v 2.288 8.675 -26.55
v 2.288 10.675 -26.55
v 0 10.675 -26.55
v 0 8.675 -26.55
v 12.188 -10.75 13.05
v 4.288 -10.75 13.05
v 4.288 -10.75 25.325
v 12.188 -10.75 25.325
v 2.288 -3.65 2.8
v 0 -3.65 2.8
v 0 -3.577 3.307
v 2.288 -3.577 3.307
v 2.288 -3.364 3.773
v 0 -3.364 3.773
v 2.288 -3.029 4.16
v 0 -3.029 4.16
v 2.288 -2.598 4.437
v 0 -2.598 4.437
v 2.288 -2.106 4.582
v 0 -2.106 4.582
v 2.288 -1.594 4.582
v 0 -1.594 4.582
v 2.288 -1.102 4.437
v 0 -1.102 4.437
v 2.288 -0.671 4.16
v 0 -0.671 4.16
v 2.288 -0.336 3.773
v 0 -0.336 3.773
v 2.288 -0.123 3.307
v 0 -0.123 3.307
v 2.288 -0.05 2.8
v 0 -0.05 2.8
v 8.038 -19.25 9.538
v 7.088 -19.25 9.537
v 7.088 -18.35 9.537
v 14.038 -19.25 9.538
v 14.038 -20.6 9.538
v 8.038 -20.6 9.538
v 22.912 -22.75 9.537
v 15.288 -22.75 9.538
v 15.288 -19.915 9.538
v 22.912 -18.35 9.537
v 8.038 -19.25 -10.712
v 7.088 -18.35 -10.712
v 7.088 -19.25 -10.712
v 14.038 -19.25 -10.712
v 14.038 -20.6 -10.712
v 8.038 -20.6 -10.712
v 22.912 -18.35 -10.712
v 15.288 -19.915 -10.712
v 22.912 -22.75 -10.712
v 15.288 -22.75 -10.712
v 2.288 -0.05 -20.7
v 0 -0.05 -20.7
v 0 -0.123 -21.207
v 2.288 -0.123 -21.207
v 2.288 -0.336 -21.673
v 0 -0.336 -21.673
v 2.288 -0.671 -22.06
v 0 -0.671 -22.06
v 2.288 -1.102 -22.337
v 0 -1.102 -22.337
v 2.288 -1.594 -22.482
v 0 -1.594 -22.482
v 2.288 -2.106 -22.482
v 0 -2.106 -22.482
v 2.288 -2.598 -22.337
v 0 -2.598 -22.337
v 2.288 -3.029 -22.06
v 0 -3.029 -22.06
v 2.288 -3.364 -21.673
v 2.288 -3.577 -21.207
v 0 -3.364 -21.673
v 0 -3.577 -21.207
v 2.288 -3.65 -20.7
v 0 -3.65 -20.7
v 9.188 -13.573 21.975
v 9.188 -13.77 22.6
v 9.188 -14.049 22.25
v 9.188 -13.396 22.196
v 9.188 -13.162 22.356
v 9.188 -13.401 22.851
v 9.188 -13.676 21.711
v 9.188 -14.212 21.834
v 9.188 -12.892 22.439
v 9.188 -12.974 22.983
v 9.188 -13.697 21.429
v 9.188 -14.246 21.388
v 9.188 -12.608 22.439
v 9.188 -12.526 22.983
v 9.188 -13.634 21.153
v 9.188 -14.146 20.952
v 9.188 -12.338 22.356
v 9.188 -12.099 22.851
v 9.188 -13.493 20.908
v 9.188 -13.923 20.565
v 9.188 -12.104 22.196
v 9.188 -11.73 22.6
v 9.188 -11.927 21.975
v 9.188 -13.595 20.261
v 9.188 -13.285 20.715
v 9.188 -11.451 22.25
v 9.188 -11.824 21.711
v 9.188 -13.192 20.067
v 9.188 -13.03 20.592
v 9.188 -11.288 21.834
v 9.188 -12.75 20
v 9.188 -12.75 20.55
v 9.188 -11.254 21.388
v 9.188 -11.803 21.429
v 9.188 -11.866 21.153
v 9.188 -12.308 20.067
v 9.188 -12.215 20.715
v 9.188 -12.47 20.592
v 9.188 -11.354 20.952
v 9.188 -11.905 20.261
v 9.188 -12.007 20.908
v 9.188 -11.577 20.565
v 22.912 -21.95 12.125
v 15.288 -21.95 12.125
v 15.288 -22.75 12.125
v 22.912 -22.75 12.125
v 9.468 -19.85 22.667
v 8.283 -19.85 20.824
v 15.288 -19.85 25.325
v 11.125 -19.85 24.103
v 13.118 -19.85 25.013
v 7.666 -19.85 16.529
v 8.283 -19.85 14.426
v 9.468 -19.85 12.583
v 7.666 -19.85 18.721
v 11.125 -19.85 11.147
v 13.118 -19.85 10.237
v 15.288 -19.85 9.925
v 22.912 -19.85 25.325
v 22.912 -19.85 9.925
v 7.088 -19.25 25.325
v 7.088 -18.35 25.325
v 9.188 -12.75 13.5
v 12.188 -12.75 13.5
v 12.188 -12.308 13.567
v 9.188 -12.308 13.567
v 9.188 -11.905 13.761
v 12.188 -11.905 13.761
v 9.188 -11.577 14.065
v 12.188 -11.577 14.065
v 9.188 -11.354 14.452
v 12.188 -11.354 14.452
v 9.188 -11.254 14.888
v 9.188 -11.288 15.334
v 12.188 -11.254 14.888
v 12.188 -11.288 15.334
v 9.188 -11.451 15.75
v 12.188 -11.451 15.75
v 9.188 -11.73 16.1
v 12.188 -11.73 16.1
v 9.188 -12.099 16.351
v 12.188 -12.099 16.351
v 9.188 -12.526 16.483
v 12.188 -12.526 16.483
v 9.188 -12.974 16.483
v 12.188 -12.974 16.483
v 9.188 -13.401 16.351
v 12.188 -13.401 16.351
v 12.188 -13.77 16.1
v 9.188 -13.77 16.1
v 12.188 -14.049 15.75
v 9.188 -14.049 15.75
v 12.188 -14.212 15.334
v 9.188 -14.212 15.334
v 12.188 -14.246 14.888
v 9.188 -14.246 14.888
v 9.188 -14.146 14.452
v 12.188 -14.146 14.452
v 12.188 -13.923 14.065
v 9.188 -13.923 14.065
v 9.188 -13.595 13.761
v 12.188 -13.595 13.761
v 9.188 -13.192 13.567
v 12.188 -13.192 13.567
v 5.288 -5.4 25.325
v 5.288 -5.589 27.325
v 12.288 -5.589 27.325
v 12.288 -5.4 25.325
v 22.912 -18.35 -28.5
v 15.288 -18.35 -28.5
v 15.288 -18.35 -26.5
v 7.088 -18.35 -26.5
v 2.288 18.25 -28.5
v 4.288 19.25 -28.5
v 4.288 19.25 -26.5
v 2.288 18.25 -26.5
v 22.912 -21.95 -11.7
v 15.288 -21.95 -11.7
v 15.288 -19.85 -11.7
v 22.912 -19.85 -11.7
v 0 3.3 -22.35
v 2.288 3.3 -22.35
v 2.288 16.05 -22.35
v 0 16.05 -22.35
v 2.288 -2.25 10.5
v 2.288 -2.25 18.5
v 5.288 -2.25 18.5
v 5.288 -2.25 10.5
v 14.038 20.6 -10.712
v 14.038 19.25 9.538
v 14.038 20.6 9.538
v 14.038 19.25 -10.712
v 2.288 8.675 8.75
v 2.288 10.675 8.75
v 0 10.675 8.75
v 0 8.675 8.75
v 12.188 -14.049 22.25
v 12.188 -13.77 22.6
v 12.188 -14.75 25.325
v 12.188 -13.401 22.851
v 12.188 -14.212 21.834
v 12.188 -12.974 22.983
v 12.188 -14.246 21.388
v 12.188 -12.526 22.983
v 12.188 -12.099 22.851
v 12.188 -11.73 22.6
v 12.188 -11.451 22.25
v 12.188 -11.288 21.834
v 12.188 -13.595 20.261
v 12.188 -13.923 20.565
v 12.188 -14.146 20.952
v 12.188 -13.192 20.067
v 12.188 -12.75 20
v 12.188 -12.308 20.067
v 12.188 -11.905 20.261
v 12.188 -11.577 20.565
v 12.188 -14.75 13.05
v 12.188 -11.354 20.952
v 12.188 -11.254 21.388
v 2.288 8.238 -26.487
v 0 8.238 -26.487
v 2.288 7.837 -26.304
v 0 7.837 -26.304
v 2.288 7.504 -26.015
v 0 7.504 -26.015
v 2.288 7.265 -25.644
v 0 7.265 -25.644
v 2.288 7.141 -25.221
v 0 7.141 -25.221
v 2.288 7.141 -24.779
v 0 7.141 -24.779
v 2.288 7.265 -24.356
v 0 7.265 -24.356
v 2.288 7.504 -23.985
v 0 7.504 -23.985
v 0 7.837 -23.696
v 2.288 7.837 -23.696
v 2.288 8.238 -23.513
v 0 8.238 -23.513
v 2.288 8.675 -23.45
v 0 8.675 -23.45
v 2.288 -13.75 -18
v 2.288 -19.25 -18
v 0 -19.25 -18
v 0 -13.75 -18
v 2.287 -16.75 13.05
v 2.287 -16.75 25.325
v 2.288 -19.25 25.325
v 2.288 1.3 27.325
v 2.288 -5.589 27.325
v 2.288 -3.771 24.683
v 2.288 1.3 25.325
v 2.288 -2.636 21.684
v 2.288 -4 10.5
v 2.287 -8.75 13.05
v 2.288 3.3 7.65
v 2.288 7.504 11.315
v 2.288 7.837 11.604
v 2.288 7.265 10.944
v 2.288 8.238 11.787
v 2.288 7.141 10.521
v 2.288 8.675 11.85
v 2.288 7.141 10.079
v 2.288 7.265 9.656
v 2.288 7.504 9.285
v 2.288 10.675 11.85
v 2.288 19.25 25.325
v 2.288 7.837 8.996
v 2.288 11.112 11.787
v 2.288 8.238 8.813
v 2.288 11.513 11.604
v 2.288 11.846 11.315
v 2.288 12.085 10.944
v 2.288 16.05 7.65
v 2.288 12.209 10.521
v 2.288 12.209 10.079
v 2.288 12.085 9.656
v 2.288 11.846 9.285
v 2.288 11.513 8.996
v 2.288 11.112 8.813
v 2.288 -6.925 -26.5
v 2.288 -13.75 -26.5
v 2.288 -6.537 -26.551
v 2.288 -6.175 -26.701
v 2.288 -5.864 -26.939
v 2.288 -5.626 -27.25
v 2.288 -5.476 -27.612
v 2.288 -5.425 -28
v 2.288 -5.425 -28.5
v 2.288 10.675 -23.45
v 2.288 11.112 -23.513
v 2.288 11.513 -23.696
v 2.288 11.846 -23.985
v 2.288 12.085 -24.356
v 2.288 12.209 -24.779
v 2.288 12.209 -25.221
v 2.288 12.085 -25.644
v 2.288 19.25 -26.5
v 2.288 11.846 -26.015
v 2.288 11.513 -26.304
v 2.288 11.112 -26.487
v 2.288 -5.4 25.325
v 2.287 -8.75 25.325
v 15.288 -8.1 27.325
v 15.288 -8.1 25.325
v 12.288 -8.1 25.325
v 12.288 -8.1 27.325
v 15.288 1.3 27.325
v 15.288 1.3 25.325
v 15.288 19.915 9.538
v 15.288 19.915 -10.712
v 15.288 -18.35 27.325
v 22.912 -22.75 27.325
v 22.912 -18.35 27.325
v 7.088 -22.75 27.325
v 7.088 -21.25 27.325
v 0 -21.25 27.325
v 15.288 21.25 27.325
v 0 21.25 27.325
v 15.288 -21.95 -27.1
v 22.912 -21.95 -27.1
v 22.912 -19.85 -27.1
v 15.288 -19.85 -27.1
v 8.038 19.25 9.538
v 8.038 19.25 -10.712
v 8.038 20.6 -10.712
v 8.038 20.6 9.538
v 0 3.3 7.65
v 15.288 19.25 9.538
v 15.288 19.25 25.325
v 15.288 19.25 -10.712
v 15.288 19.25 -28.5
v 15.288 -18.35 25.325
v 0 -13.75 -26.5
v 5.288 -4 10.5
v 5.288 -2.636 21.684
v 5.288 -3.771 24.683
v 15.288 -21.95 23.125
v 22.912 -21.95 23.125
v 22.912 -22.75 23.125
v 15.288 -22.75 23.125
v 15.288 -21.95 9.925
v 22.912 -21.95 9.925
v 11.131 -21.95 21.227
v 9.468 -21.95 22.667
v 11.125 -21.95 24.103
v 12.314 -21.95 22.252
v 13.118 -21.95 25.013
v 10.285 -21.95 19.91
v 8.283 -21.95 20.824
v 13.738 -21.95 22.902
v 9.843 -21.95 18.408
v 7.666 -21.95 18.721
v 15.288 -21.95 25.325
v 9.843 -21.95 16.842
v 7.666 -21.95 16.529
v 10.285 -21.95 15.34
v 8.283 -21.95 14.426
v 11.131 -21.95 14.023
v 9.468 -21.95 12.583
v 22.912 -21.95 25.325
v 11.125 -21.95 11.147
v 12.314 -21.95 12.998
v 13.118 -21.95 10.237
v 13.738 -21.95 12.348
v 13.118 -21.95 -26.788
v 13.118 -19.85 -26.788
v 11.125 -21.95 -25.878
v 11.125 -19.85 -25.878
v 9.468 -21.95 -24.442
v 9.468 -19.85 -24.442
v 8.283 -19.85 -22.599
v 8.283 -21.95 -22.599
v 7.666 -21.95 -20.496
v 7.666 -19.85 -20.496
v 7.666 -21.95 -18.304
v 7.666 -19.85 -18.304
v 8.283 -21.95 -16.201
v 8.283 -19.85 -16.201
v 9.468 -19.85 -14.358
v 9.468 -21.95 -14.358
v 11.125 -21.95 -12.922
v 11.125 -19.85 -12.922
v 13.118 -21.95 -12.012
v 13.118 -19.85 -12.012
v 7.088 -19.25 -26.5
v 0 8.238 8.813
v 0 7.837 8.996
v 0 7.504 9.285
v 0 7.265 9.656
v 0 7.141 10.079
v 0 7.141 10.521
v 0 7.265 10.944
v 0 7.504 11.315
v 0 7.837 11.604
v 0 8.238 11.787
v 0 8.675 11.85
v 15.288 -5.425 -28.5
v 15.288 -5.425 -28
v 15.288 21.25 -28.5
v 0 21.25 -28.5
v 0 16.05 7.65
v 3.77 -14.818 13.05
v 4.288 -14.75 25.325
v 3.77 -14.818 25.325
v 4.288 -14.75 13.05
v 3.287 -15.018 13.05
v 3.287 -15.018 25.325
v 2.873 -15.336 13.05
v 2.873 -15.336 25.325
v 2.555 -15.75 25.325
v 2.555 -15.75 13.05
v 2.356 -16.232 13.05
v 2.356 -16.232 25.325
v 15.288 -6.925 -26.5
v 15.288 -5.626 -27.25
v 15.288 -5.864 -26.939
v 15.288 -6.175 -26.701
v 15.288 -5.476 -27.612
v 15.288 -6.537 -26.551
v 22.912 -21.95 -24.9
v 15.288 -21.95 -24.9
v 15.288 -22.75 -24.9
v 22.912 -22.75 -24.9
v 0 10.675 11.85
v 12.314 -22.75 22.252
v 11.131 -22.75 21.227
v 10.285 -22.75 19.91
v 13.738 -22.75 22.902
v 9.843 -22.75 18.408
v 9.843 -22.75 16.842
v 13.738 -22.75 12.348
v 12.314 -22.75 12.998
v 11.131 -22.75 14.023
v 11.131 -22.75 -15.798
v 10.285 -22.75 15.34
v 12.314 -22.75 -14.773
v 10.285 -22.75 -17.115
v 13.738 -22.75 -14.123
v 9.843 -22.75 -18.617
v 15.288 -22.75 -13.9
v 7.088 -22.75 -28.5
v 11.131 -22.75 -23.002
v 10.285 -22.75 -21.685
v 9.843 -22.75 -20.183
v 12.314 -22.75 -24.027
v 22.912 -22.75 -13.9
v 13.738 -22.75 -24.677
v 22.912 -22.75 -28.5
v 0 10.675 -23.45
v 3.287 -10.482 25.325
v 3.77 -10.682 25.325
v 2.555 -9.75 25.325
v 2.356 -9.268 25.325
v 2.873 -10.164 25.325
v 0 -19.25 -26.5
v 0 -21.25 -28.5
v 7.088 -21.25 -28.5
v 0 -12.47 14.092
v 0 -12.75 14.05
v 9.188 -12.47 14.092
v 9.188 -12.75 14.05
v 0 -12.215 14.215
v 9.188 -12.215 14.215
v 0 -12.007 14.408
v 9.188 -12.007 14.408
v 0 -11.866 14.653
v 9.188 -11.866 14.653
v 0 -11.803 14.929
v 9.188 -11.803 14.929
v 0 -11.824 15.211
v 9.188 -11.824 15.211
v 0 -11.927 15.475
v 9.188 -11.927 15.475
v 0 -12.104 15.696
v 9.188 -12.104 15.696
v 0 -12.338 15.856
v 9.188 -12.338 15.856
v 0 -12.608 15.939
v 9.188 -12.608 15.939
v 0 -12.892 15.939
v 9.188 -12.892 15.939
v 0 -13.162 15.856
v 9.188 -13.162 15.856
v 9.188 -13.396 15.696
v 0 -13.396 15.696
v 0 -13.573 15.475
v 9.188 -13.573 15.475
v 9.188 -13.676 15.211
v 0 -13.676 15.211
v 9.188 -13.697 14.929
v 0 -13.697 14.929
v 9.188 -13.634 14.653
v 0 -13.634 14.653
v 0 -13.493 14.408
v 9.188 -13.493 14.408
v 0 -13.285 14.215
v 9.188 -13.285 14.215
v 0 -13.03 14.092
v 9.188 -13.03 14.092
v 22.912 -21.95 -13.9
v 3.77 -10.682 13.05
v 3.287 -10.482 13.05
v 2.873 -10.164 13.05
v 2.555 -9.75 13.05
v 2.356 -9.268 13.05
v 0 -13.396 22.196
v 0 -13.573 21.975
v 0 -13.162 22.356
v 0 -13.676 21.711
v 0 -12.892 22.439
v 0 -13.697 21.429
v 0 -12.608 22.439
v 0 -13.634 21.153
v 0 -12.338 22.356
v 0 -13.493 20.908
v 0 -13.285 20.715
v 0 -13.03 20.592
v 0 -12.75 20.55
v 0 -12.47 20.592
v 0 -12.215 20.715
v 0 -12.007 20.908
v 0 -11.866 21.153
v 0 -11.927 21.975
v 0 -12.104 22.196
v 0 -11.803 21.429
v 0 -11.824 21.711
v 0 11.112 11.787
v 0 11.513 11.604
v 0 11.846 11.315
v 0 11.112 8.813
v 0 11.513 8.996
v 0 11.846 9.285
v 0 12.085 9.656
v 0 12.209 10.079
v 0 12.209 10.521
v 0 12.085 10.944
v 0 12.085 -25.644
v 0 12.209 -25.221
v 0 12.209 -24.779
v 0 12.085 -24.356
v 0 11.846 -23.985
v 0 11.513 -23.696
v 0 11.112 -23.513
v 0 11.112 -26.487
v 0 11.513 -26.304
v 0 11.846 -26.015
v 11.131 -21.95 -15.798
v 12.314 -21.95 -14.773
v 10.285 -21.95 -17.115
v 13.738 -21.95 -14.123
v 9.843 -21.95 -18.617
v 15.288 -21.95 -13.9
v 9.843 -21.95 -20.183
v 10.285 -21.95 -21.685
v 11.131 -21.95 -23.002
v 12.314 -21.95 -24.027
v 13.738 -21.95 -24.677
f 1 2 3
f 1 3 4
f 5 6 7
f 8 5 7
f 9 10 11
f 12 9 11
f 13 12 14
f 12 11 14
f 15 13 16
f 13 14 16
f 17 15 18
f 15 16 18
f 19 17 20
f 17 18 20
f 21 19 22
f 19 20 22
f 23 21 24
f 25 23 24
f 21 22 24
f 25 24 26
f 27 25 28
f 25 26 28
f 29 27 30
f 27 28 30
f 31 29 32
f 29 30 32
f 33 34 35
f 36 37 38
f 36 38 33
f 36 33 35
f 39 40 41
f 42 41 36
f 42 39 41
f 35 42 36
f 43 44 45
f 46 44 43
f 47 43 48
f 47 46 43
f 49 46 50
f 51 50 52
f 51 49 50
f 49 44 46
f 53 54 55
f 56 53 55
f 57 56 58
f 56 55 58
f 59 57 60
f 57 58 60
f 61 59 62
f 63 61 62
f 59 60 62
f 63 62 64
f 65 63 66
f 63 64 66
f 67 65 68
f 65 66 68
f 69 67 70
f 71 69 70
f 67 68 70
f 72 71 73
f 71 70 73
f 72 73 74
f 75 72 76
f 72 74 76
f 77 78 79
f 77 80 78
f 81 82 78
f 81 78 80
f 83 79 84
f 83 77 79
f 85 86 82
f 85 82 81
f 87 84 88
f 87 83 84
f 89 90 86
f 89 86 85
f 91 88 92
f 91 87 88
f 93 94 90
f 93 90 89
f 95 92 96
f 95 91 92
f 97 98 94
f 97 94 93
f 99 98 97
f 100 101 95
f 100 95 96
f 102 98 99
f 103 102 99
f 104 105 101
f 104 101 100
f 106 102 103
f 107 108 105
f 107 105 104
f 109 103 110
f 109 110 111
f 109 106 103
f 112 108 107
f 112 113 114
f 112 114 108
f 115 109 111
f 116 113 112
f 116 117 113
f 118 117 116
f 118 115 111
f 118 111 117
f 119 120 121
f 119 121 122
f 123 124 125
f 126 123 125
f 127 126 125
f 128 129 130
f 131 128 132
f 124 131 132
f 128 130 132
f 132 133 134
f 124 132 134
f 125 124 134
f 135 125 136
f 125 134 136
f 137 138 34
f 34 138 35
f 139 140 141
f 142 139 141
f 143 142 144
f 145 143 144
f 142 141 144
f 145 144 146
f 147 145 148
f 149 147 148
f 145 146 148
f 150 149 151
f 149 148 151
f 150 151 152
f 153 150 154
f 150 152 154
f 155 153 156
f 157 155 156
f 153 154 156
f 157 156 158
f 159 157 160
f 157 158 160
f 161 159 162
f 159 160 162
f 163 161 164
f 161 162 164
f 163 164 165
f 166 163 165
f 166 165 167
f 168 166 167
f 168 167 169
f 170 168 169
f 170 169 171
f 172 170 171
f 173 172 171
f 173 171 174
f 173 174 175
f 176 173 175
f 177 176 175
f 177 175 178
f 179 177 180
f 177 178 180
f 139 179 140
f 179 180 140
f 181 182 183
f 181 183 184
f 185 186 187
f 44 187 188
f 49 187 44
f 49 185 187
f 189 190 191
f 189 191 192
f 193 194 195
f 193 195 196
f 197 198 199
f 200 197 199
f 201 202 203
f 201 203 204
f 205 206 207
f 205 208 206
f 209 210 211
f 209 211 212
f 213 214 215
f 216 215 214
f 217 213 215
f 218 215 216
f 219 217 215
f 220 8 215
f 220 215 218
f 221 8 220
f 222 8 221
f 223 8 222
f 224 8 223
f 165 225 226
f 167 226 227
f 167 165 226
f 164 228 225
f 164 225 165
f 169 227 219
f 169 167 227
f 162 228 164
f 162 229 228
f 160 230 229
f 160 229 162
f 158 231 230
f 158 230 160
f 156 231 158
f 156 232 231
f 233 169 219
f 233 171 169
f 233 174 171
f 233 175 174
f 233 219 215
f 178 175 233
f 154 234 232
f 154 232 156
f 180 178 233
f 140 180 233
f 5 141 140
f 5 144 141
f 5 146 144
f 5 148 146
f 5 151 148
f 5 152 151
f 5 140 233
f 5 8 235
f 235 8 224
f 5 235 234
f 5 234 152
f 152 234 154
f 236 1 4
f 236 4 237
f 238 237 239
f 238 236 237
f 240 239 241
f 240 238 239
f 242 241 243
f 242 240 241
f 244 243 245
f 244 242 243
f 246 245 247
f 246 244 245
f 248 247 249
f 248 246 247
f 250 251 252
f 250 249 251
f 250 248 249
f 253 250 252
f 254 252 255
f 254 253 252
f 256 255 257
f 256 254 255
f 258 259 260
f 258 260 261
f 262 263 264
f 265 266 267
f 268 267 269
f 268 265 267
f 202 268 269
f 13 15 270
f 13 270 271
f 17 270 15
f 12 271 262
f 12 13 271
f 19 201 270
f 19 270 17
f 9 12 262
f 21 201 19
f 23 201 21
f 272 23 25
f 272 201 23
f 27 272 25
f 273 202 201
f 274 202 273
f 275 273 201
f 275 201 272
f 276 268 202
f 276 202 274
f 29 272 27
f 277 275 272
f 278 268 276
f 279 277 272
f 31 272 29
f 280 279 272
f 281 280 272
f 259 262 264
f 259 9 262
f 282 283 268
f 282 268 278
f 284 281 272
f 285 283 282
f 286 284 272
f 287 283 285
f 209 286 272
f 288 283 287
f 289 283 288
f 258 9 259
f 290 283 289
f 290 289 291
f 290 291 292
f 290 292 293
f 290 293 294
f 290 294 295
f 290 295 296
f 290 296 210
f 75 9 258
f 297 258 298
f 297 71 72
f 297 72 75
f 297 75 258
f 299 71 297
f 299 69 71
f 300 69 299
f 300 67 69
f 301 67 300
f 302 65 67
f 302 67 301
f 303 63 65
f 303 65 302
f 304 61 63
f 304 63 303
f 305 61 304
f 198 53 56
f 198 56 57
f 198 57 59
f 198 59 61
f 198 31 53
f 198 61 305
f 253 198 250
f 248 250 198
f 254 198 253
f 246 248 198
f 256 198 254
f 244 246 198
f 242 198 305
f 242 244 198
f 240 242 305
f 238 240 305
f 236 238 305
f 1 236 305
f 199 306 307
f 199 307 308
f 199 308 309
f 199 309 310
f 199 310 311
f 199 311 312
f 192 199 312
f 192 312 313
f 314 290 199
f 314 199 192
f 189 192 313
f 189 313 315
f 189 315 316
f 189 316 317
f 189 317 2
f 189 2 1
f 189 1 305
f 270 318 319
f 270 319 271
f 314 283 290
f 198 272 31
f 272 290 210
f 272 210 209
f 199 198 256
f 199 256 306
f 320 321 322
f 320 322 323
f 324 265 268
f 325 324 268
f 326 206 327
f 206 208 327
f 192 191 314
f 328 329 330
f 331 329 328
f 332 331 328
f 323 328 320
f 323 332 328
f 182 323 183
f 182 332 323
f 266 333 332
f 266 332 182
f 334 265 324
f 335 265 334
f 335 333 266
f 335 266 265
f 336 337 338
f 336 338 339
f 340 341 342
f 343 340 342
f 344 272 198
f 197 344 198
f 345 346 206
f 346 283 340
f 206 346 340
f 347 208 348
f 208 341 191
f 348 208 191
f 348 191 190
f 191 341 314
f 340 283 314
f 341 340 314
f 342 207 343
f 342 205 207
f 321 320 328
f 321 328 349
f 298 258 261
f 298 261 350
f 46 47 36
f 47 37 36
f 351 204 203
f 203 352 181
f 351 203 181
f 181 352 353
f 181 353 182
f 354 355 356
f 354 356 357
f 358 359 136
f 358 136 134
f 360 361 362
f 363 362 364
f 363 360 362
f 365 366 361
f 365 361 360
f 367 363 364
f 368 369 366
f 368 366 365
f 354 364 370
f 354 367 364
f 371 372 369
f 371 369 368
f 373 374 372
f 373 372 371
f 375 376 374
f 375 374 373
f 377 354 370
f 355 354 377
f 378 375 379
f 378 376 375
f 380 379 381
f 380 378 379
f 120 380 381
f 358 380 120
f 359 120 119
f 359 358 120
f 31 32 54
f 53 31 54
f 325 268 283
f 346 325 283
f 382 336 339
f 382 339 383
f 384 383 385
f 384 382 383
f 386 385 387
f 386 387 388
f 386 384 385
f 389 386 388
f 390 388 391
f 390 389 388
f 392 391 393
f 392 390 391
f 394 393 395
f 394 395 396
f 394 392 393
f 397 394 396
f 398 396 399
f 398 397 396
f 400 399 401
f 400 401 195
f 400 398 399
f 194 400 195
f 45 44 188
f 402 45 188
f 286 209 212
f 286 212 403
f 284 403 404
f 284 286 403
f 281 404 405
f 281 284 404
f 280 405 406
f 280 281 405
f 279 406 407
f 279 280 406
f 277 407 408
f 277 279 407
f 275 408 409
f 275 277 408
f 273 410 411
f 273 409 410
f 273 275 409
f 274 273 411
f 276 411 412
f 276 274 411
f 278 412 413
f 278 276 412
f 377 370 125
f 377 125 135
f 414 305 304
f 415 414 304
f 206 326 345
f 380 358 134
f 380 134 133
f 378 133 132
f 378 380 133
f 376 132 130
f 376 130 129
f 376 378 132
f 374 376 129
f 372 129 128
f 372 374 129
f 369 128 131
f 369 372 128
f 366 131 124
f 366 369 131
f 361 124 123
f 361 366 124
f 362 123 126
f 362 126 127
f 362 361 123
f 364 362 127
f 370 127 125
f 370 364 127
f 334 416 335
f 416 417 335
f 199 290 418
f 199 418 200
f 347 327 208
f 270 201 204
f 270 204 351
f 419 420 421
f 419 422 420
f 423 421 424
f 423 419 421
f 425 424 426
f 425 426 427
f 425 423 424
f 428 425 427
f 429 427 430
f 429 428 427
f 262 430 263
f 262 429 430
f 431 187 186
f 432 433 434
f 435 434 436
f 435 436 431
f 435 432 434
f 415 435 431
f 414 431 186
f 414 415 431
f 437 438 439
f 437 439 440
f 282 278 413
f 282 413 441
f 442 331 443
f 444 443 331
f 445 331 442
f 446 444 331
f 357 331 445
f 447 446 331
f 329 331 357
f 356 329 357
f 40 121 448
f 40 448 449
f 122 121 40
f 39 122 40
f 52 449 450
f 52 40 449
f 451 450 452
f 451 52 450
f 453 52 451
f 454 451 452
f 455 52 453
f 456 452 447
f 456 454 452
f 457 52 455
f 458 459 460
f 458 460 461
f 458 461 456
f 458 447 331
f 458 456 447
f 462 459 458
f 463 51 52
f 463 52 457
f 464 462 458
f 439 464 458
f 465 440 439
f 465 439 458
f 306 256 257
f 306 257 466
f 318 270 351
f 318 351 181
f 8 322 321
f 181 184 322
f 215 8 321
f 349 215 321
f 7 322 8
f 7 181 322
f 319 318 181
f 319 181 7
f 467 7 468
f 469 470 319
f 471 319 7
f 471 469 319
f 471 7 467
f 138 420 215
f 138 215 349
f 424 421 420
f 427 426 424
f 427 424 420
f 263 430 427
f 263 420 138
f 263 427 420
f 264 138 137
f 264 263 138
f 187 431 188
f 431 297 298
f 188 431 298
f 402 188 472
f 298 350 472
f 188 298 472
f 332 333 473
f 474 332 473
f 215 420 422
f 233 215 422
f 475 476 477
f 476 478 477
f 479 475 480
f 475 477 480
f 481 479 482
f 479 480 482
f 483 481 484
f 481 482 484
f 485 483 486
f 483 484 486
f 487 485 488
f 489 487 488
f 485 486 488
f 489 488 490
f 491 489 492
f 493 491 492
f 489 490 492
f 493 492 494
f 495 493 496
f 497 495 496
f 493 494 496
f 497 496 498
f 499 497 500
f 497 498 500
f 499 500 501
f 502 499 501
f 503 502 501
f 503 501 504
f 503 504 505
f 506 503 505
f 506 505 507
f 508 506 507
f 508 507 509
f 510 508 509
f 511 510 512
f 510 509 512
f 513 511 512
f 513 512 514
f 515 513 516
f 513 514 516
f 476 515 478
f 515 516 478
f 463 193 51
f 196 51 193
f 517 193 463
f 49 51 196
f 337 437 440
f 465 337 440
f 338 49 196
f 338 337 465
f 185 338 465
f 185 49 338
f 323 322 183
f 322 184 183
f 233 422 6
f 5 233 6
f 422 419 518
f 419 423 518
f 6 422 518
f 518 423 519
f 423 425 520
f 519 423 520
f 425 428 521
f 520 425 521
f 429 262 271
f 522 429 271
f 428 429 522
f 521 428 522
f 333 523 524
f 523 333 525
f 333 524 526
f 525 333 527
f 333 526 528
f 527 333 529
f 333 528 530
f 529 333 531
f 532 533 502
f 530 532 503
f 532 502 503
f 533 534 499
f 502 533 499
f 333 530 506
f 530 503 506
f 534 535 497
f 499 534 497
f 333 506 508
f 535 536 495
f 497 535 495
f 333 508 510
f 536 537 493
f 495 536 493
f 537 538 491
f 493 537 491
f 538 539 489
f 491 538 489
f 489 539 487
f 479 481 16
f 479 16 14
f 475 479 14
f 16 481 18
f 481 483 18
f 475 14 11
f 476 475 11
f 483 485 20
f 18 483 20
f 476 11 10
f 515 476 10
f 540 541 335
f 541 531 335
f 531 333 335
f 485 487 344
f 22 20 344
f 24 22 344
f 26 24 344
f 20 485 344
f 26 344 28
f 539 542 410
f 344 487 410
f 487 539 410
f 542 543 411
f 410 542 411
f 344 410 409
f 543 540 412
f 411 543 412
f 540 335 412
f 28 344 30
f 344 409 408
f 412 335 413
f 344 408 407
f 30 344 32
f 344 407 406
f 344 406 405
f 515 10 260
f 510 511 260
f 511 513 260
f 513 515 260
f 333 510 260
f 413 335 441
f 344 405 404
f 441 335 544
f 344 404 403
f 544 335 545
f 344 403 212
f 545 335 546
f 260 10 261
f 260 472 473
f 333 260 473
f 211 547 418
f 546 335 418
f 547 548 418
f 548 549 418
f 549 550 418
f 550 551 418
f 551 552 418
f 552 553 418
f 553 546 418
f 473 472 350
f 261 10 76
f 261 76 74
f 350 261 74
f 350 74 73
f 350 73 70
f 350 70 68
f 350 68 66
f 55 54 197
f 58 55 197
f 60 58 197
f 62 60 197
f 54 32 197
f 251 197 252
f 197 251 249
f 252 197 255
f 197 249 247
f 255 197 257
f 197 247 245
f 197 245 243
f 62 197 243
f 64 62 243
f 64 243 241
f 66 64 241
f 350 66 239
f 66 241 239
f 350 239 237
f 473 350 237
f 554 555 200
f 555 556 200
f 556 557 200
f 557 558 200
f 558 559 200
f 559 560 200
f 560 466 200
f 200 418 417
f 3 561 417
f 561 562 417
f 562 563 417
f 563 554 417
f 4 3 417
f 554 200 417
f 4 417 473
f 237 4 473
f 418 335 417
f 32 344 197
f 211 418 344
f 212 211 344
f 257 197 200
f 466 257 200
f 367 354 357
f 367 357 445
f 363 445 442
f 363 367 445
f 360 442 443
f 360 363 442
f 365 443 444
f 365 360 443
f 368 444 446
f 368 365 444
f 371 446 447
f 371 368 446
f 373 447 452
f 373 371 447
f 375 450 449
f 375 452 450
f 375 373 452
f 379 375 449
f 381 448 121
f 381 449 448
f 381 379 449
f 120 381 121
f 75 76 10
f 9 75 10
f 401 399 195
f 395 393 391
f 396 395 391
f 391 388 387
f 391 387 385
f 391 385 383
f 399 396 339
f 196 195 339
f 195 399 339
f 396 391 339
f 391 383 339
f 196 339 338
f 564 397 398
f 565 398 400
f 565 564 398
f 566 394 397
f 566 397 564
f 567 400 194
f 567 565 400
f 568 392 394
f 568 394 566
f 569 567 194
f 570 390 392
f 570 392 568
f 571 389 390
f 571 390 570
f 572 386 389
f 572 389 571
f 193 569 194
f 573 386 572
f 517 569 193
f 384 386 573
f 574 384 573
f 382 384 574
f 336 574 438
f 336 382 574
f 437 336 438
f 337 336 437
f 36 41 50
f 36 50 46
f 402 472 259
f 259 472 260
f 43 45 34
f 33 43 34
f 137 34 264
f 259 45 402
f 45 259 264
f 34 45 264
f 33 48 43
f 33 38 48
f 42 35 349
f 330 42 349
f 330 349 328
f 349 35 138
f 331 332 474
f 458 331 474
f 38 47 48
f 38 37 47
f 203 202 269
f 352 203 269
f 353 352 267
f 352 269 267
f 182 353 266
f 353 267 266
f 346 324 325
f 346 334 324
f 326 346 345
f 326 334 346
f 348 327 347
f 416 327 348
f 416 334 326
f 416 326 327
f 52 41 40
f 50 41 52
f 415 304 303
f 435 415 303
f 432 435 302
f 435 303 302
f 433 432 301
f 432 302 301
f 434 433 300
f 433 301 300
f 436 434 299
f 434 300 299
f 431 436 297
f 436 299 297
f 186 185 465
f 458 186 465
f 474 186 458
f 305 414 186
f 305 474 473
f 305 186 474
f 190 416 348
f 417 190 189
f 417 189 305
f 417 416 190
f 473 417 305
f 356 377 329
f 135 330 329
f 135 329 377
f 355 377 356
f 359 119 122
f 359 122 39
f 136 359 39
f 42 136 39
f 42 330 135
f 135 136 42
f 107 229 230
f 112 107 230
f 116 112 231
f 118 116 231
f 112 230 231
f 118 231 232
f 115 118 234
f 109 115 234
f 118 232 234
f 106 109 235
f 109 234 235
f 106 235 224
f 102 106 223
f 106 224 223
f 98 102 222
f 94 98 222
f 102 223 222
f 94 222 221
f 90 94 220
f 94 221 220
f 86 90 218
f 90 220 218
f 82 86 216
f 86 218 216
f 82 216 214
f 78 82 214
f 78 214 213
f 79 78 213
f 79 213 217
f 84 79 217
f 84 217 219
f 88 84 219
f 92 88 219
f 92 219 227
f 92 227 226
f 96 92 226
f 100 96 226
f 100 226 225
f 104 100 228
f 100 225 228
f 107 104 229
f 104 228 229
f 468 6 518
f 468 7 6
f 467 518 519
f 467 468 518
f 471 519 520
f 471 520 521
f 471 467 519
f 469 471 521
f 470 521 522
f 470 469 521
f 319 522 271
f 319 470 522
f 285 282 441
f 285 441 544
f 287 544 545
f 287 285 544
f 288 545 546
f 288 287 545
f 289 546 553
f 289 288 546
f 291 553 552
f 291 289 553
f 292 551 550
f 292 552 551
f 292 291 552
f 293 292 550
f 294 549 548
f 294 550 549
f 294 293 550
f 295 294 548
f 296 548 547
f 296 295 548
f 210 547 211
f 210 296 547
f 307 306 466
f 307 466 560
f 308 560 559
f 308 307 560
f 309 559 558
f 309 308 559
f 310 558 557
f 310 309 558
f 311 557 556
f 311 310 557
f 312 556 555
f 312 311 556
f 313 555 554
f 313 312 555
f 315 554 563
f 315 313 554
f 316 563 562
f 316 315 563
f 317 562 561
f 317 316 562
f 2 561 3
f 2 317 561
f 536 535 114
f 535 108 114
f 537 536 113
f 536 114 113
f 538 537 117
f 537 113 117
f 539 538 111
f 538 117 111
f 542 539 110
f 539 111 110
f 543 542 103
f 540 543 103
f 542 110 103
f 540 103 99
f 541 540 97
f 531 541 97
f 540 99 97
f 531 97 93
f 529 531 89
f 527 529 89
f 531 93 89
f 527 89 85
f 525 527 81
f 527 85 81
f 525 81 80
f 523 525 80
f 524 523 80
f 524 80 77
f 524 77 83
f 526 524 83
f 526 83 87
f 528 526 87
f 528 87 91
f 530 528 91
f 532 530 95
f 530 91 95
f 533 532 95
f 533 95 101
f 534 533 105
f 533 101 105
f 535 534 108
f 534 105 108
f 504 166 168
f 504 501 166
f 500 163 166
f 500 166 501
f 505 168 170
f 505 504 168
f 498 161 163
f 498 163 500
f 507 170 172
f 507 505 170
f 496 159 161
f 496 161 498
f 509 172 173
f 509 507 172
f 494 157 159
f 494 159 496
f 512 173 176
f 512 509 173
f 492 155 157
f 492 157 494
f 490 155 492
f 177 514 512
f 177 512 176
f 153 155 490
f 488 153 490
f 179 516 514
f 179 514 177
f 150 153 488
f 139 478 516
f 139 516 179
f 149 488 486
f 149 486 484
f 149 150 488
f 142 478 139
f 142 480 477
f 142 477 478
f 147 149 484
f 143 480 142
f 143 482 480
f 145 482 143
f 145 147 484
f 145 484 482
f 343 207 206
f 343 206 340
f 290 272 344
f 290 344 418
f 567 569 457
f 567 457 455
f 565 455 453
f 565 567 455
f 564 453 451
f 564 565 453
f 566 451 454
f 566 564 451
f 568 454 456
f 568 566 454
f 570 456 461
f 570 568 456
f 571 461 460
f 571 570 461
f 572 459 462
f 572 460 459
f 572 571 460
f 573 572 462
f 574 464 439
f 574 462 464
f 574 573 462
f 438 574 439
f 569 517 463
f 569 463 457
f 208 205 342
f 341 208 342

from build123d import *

# Parameters (mm, degrees)
MAIN_EXTRUDE_DEPTH            = 2.2875
WALLS_START                   = 2.2875
WALLS_DEPTH                   = 13
CORNER_SUPPORT_DEPTH          = 2
SKETCH2_R                     = 0.95
SKETCH2_W                     = 2.4
SKETCH2_H                     = 4
SKETCH2_W_2                   = 1
SWITCH_SPACER_DEPTH           = 9.9
ARM_SUPPORT_EXTRUDE_DEPTH     = 3
ARM_SUPPORT_CURVE_DEPTH       = 40.380356778
FILLET4_R                     = 2
FILLET3_R                     = 2
SKETCH2_5_R                   = 0.95
SWITCH_MOUNT_HOLES_DEPTH      = 40.380356889
SWITCH_MOUNT_HOLES_DEPTH_BACK = 40.380356889
SKETCH35_R                    = 1.5
SWITCH_MOUNT_EXIT_HOLES_DEPTH = 3
SKETCH4_W                     = 8.5
SKETCH4_H                     = 5.5
WIRE_HOLE_DEPTH               = 40.380356889
SKETCH25_W                    = 6
SKETCH25_H                    = 1.35
FEMALE_SNAP_DEPTH             = 10.125
SKETCH5_W                     = 30
SKETCH5_H                     = 12.75
SERVO_HOLE_DEPTH              = 40.380356889
SKETCH30_W                    = 15.7875
SKETCH30_H                    = 0.9
SKETCH30_W_2                  = 17.7875
SKETCH30_H_2                  = 1.5
MAGNET_EXTRUDE_1_DEPTH        = 7.625
MAGNET_EXTRUDE_1_DEPTH_BACK   = 8.2
SKETCH30_5_W                  = 20.25
SKETCH30_5_H                  = 1.5
MAGNET_EXTRUDE_2_DEPTH        = 8.2
SKETCH29_R                    = 7.7
MAGNET_HOLE_DEPTH             = 2.1
SKETCH31_R                    = 5.5
MAGNET_THRU_HOLE_DEPTH        = 58.632218961
SKETCH39_W                    = 3.175
SKETCH39_H                    = 12.55
CUT_EXTRUDE1_DEPTH            = 45.416158798
CUT_EXTRUDE2_DEPTH            = 42.895144408
BOSS_EXTRUDE2_DEPTH           = 10


with BuildPart() as part:
    # Sketch1 → Main Extrude (new body)
    with BuildSketch(Plane(origin=(0, 0, 0), x_dir=(0, 0, -1), z_dir=(1, 0, 0))):
        Polygon((-30.5, -9.35), (-27.325, -9.35), (-27.325, -21.25), (28.5, -21.25), (28.5, 21.25), (-27.325, 21.25), (-27.325, 3.2), (-30.5, 3.2), align=None)
        with BuildLine():
            Line((20.7, -3.65), (-2.8, -3.65))
            ThreePointArc((-2.8, -3.65), (-4.6, -1.85), (-2.8, -0.05))
            Line((-2.8, -0.05), (20.7, -0.05))
            ThreePointArc((20.7, -0.05), (22.5, -1.85), (20.7, -3.65))
        make_face(mode=Mode.SUBTRACT)
    extrude(amount=MAIN_EXTRUDE_DEPTH)

    # Sketch1_3 → Walls (add)
    with BuildSketch(Plane(origin=(0, 0, 0), x_dir=(0, 0, -1), z_dir=(1, 0, 0)).offset(WALLS_START)):
        Polygon((-25.325, 19.25), (28.5, 19.25), (28.5, 21.25), (-27.325, 21.25), (-27.325, 3.2), (-30.5, 3.2), (-30.5, 1.3), (-25.325, 1.3), align=None)
        with BuildLine():
            Line((28.5, -5.425), (28, -5.425))
            ThreePointArc((28, -5.425), (26.939339828, -5.864339828), (26.5, -6.925))
            Line((26.5, -6.925), (26.5, -19.25))
            Line((26.5, -19.25), (-25.325, -19.25))
            Line((-25.325, -19.25), (-25.325, -8.1))
            Line((-25.325, -8.1), (-28.5, -8.1))
            Line((-28.5, -8.1), (-28.5, -4.45))
            Line((-28.5, -4.45), (-30.5, -4.45))
            Line((-30.5, -4.45), (-30.5, -9.35))
            Line((-30.5, -9.35), (-27.325, -9.35))
            Line((-27.325, -9.35), (-27.325, -21.25))
            Line((-27.325, -21.25), (28.5, -21.25))
            Line((28.5, -21.25), (28.5, -5.425))
        make_face()
    extrude(amount=WALLS_DEPTH)

    # Sketch22 → Corner Support (add)
    with BuildSketch(Plane(origin=(0, 0, -28.5), x_dir=(-1, 0, 0), z_dir=(0, 0, -1))):
        Polygon((-4.2875, 19.25), (-2.2875, 18.25), (-2.2875, 19.25), align=None)
    extrude(amount=-CORNER_SUPPORT_DEPTH)

    # Sketch2 → Switch Spacer (add)
    with BuildSketch(Plane(origin=(2.2875, 0, 0), x_dir=(0, 0, -1), z_dir=(1, 0, 0))):
        Polygon((-14.05, -10.75), (-17.05, -10.75), (-17.05, -14.75), (-14.05, -14.75), (-14.05, -12.75), align=None)
        with Locations((-15, -12.75)):
            Circle(SKETCH2_R, mode=Mode.SUBTRACT)
        with Locations((-15, -12.75)):
            Circle(SKETCH2_R)
        Polygon((-19.45, -10.75), (-22.45, -10.75), (-22.45, -12.75), (-22.45, -14.75), (-19.45, -14.75), align=None)
        with BuildLine():
            ThreePointArc((-20.55, -12.75), (-21.5, -13.7), (-22.45, -12.75))
            ThreePointArc((-22.45, -12.75), (-21.5, -11.8), (-20.55, -12.75))
        make_face(mode=Mode.SUBTRACT)
        with Locations((-21.5, -12.75)):
            Circle(SKETCH2_R)
        Polygon((-22.45, -12.75), (-22.45, -10.75), (-25.325, -10.75), (-25.325, -14.75), (-22.45, -14.75), align=None)
        with Locations((-18.25, -12.75)):
            Rectangle(SKETCH2_W, SKETCH2_H)
        with Locations((-13.55, -12.75)):
            Rectangle(SKETCH2_W_2, SKETCH2_H)
    extrude(amount=SWITCH_SPACER_DEPTH)

    # Sketch3 → Arm Support Extrude (add)
    with BuildSketch(Plane(origin=(2.2875, 0, 0), x_dir=(0, 0, -1), z_dir=(1, 0, 0))):
        with BuildLine():
            Line((-18.5, -2.25), (-10.5, -2.25))
            Line((-10.5, -2.25), (-10.5, -4))
            Line((-10.5, -4), (-28.5, -5.7))
            Line((-28.5, -5.7), (-30.5, -5.7))
            ThreePointArc((-30.5, -5.7), (-24.743046131, -3.129622151), (-18.5, -2.25))
        make_face()
    extrude(amount=ARM_SUPPORT_EXTRUDE_DEPTH)

    # Sketch7 → Arm Support Curve (cut, through all)
    with BuildSketch(Plane(origin=(2.2875, 0, 0), x_dir=(0, 0, -1), z_dir=(1, 0, 0))):
        with BuildLine():
            Line((-28.5, -4.583410824), (-28.5, -4.45))
            Line((-28.5, -4.45), (-30.5, -4.45))
            Line((-30.5, -4.45), (-30.5, -5.7))
            ThreePointArc((-30.5, -5.7), (-29.627655409, -5.180138898), (-28.73283292, -4.7))
            ThreePointArc((-28.73283292, -4.7), (-28.616584416, -4.641369997), (-28.5, -4.583410824))
        make_face()
    extrude(amount=ARM_SUPPORT_CURVE_DEPTH, mode=Mode.SUBTRACT)

    # Fillet4
    fillet4_edges = [part.edges().sort_by_distance(p)[0] for p in [
        (2.2875, -2.2, 30.5),
    ]]
    fillet(fillet4_edges, radius=FILLET4_R)

    # Fillet3
    fillet3_edges = [part.edges().sort_by_distance(p)[0] for p in [
        (2.2875, -14.75, 19.1875),
        (2.2875, -10.75, 19.1875),
    ]]
    fillet(fillet3_edges, radius=FILLET3_R)

    # Sketch2_5 → Switch Mount Holes (cut, two sides)
    with BuildSketch(Plane(origin=(2.2875, 0, 0), x_dir=(0, 0, -1), z_dir=(1, 0, 0))) as switch_mount_holes_sk:
        with Locations((-21.5, -12.75)):
            Circle(SKETCH2_5_R)
        with Locations((-15, -12.75)):
            Circle(SKETCH2_5_R)
    extrude(amount=SWITCH_MOUNT_HOLES_DEPTH, mode=Mode.SUBTRACT)
    extrude(switch_mount_holes_sk.sketch, amount=-SWITCH_MOUNT_HOLES_DEPTH_BACK, mode=Mode.SUBTRACT)

    # Sketch35 → Switch Mount Exit Holes (cut)
    with BuildSketch(Plane(origin=(12.1875, 0, 0), x_dir=(0, 0, -1), z_dir=(1, 0, 0))):
        with Locations((-21.5, -12.75)):
            Circle(SKETCH35_R)
        with Locations((-15, -12.75)):
            Circle(SKETCH35_R)
    extrude(amount=-SWITCH_MOUNT_EXIT_HOLES_DEPTH, mode=Mode.SUBTRACT)

    # Sketch4 → Wire Hole (cut, through all)
    with BuildSketch(Plane(origin=(2.2875, 0, 0), x_dir=(0, 0, -1), z_dir=(1, 0, 0))):
        with Locations((22.25, -16.5)):
            Rectangle(SKETCH4_W, SKETCH4_H)
    extrude(amount=-WIRE_HOLE_DEPTH, mode=Mode.SUBTRACT)

    # Sketch25 → Female Snap (cut, symmetric)
    with BuildSketch(Plane(origin=(0, 0, -0.5875), x_dir=(-1, 0, 0), z_dir=(0, 0, -1))):
        with Locations((-11.0375, -19.925)):
            Rectangle(SKETCH25_W, SKETCH25_H)
        Polygon((-15.2875, -19.25), (-15.2875, -19.91463679), (-14.0375, -19.25), align=None)
        with Locations((-11.0375, 19.925)):
            Rectangle(SKETCH25_W, SKETCH25_H)
        Polygon((-15.2875, 19.91463679), (-15.2875, 19.25), (-14.0375, 19.25), align=None)
    extrude(amount=FEMALE_SNAP_DEPTH, both=True, mode=Mode.SUBTRACT)

    # Sketch5 → Servo Hole (cut, through all)
    with BuildSketch(Plane(origin=(2.2875, 0, 0), x_dir=(0, 0, -1), z_dir=(1, 0, 0))):
        with Locations((7.35, 9.675)):
            Rectangle(SKETCH5_W, SKETCH5_H)
        with BuildLine():
            Line((-8.75, 10.675), (-8.75, 8.675))
            ThreePointArc((-8.75, 8.675), (-10.3, 7.125), (-11.85, 8.675))
            Line((-11.85, 8.675), (-11.85, 10.675))
            ThreePointArc((-11.85, 10.675), (-10.3, 12.225), (-8.75, 10.675))
        make_face()
        with BuildLine():
            Line((26.55, 10.675), (26.55, 8.675))
            ThreePointArc((26.55, 8.675), (25, 7.125), (23.45, 8.675))
            Line((23.45, 8.675), (23.45, 10.675))
            ThreePointArc((23.45, 10.675), (25, 12.225), (26.55, 10.675))
        make_face()
    extrude(amount=-SERVO_HOLE_DEPTH, mode=Mode.SUBTRACT)

    # Sketch30 → Magnet Extrude 1 (add, two sides)
    with BuildSketch(Plane(origin=(15.2875, 0, 0), x_dir=(0, 0, -1), z_dir=(1, 0, 0))) as magnet_extrude_1_sk:
        Polygon((-27.325, -18.35), (-27.325, -21.25), (-9.5375, -21.25), (-9.5375, -19.91463679), (-9.5375, -19.25), (-25.325, -19.25), (-25.325, -18.35), align=None)
        with Locations((-17.43125, -18.8)):
            Rectangle(SKETCH30_W, SKETCH30_H)
        with Locations((19.60625, -22)):
            Rectangle(SKETCH30_W_2, SKETCH30_H_2)
        Polygon((10.7125, -19.91463679), (10.7125, -21.25), (28.5, -21.25), (28.5, -18.35), (26.5, -18.35), (26.5, -19.25), (10.7125, -19.25), align=None)
        with Locations((-18.43125, -22)):
            Rectangle(SKETCH30_W_2, SKETCH30_H_2)
        with Locations((18.60625, -18.8)):
            Rectangle(SKETCH30_W, SKETCH30_H)
    extrude(amount=MAGNET_EXTRUDE_1_DEPTH)
    extrude(magnet_extrude_1_sk.sketch, amount=-MAGNET_EXTRUDE_1_DEPTH_BACK)

    # Sketch30_5 → Magnet Extrude 2 (add)
    with BuildSketch(Plane(origin=(15.2875, 0, 0), x_dir=(0, 0, -1), z_dir=(1, 0, 0))):
        with Locations((0.5875, -22)):
            Rectangle(SKETCH30_5_W, SKETCH30_5_H)
    extrude(amount=-MAGNET_EXTRUDE_2_DEPTH)

    # Sketch29 → Magnet Hole (cut)
    with BuildSketch(Plane(origin=(0, -21.95, 0), x_dir=(1, 0, 0), z_dir=(0, 1, 0))):
        with Locations((15.2875, -17.625)):
            Circle(SKETCH29_R)
        with BuildLine():
            ThreePointArc((22.9125, -18.697089082), (20.338980677, -23.436414885), (15.2875, -25.325))
            Line((15.2875, -25.325), (22.9125, -25.325))
            Line((22.9125, -25.325), (22.9125, -18.697089082))
        make_face()
        with BuildLine():
            Line((22.9125, -9.925), (15.2875, -9.925))
            ThreePointArc((15.2875, -9.925), (20.338980677, -11.813585115), (22.9125, -16.552910918))
            Line((22.9125, -16.552910918), (22.9125, -9.925))
        make_face()
        with Locations((15.2875, 19.4)):
            Circle(SKETCH29_R)
        with BuildLine():
            ThreePointArc((22.9125, 18.327910918), (20.338980677, 13.588585115), (15.2875, 11.7))
            Line((15.2875, 11.7), (22.9125, 11.7))
            Line((22.9125, 11.7), (22.9125, 18.327910918))
        make_face()
        with BuildLine():
            Line((22.9125, 27.1), (15.2875, 27.1))
            ThreePointArc((15.2875, 27.1), (20.338980677, 25.211414885), (22.9125, 20.472089082))
            Line((22.9125, 20.472089082), (22.9125, 27.1))
        make_face()
        with BuildLine():
            ThreePointArc((22.9875, -17.625), (22.968727116, -17.087645368), (22.9125, -16.552910918))
            Line((22.9125, -16.552910918), (22.9125, -18.697089082))
            ThreePointArc((22.9125, -18.697089082), (22.968727116, -18.162354632), (22.9875, -17.625))
        make_face()
        with BuildLine():
            Line((22.9125, 20.472089082), (22.9125, 18.327910918))
            ThreePointArc((22.9125, 18.327910918), (22.968727116, 18.862645368), (22.9875, 19.4))
            ThreePointArc((22.9875, 19.4), (22.968727116, 19.937354632), (22.9125, 20.472089082))
        make_face()
    extrude(amount=MAGNET_HOLE_DEPTH, mode=Mode.SUBTRACT)

    # Sketch31 → Magnet Thru Hole (cut, through all)
    with BuildSketch(Plane.XZ.offset(21.95)):
        with Locations((15.2875, 17.625)):
            Circle(SKETCH31_R)
        with BuildLine():
            Line((22.9125, 23.125), (15.2875, 23.125))
            ThreePointArc((15.2875, 23.125), (19.176587297, 21.514087297), (20.7875, 17.625))
            ThreePointArc((20.7875, 17.625), (19.176587297, 13.735912703), (15.2875, 12.125))
            Line((15.2875, 12.125), (22.9125, 12.125))
            Line((22.9125, 12.125), (22.9125, 23.125))
        make_face()
        with Locations((15.2875, -19.4)):
            Circle(SKETCH31_R)
        with BuildLine():
            Line((22.9125, -13.9), (15.2875, -13.9))
            ThreePointArc((15.2875, -13.9), (19.176587297, -15.510912703), (20.7875, -19.4))
            ThreePointArc((20.7875, -19.4), (19.176587297, -23.289087297), (15.2875, -24.9))
            Line((15.2875, -24.9), (22.9125, -24.9))
            Line((22.9125, -24.9), (22.9125, -13.9))
        make_face()
    extrude(amount=MAGNET_THRU_HOLE_DEPTH, mode=Mode.SUBTRACT)

    # Sketch39 → Cut-Extrude1 (cut, through all)
    with BuildSketch(Plane.ZY):
        with Locations((28.9125, -3.075)):
            Rectangle(SKETCH39_W, SKETCH39_H)
    extrude(amount=-CUT_EXTRUDE1_DEPTH, mode=Mode.SUBTRACT)

    # Sketch40 → Cut-Extrude2 (cut, through all)
    with BuildSketch(Plane(origin=(2.2875, 0, 0), x_dir=(0, 0, -1), z_dir=(1, 0, 0))):
        with BuildLine():
            Line((-27.325, -5.589027778), (-27.325, -4.044715402))
            ThreePointArc((-27.325, -4.044715402), (-23.002822125, -2.703224466), (-18.5, -2.25))
            ThreePointArc((-18.5, -2.25), (-23.217778383, -3.112667731), (-27.325, -5.589027778))
        make_face()
    extrude(amount=CUT_EXTRUDE2_DEPTH, mode=Mode.SUBTRACT)

    # Sketch41 → Boss-Extrude2 (add)
    with BuildSketch(Plane(origin=(2.2875, 0, 0), x_dir=(0, 0, -1), z_dir=(1, 0, 0))):
        Polygon((-25.325, -8.1), (-27.325, -8.1), (-27.325, -5.589027778), (-25.325, -5.400138889), align=None)
    extrude(amount=BOSS_EXTRUDE2_DEPTH)


solid = part.part
